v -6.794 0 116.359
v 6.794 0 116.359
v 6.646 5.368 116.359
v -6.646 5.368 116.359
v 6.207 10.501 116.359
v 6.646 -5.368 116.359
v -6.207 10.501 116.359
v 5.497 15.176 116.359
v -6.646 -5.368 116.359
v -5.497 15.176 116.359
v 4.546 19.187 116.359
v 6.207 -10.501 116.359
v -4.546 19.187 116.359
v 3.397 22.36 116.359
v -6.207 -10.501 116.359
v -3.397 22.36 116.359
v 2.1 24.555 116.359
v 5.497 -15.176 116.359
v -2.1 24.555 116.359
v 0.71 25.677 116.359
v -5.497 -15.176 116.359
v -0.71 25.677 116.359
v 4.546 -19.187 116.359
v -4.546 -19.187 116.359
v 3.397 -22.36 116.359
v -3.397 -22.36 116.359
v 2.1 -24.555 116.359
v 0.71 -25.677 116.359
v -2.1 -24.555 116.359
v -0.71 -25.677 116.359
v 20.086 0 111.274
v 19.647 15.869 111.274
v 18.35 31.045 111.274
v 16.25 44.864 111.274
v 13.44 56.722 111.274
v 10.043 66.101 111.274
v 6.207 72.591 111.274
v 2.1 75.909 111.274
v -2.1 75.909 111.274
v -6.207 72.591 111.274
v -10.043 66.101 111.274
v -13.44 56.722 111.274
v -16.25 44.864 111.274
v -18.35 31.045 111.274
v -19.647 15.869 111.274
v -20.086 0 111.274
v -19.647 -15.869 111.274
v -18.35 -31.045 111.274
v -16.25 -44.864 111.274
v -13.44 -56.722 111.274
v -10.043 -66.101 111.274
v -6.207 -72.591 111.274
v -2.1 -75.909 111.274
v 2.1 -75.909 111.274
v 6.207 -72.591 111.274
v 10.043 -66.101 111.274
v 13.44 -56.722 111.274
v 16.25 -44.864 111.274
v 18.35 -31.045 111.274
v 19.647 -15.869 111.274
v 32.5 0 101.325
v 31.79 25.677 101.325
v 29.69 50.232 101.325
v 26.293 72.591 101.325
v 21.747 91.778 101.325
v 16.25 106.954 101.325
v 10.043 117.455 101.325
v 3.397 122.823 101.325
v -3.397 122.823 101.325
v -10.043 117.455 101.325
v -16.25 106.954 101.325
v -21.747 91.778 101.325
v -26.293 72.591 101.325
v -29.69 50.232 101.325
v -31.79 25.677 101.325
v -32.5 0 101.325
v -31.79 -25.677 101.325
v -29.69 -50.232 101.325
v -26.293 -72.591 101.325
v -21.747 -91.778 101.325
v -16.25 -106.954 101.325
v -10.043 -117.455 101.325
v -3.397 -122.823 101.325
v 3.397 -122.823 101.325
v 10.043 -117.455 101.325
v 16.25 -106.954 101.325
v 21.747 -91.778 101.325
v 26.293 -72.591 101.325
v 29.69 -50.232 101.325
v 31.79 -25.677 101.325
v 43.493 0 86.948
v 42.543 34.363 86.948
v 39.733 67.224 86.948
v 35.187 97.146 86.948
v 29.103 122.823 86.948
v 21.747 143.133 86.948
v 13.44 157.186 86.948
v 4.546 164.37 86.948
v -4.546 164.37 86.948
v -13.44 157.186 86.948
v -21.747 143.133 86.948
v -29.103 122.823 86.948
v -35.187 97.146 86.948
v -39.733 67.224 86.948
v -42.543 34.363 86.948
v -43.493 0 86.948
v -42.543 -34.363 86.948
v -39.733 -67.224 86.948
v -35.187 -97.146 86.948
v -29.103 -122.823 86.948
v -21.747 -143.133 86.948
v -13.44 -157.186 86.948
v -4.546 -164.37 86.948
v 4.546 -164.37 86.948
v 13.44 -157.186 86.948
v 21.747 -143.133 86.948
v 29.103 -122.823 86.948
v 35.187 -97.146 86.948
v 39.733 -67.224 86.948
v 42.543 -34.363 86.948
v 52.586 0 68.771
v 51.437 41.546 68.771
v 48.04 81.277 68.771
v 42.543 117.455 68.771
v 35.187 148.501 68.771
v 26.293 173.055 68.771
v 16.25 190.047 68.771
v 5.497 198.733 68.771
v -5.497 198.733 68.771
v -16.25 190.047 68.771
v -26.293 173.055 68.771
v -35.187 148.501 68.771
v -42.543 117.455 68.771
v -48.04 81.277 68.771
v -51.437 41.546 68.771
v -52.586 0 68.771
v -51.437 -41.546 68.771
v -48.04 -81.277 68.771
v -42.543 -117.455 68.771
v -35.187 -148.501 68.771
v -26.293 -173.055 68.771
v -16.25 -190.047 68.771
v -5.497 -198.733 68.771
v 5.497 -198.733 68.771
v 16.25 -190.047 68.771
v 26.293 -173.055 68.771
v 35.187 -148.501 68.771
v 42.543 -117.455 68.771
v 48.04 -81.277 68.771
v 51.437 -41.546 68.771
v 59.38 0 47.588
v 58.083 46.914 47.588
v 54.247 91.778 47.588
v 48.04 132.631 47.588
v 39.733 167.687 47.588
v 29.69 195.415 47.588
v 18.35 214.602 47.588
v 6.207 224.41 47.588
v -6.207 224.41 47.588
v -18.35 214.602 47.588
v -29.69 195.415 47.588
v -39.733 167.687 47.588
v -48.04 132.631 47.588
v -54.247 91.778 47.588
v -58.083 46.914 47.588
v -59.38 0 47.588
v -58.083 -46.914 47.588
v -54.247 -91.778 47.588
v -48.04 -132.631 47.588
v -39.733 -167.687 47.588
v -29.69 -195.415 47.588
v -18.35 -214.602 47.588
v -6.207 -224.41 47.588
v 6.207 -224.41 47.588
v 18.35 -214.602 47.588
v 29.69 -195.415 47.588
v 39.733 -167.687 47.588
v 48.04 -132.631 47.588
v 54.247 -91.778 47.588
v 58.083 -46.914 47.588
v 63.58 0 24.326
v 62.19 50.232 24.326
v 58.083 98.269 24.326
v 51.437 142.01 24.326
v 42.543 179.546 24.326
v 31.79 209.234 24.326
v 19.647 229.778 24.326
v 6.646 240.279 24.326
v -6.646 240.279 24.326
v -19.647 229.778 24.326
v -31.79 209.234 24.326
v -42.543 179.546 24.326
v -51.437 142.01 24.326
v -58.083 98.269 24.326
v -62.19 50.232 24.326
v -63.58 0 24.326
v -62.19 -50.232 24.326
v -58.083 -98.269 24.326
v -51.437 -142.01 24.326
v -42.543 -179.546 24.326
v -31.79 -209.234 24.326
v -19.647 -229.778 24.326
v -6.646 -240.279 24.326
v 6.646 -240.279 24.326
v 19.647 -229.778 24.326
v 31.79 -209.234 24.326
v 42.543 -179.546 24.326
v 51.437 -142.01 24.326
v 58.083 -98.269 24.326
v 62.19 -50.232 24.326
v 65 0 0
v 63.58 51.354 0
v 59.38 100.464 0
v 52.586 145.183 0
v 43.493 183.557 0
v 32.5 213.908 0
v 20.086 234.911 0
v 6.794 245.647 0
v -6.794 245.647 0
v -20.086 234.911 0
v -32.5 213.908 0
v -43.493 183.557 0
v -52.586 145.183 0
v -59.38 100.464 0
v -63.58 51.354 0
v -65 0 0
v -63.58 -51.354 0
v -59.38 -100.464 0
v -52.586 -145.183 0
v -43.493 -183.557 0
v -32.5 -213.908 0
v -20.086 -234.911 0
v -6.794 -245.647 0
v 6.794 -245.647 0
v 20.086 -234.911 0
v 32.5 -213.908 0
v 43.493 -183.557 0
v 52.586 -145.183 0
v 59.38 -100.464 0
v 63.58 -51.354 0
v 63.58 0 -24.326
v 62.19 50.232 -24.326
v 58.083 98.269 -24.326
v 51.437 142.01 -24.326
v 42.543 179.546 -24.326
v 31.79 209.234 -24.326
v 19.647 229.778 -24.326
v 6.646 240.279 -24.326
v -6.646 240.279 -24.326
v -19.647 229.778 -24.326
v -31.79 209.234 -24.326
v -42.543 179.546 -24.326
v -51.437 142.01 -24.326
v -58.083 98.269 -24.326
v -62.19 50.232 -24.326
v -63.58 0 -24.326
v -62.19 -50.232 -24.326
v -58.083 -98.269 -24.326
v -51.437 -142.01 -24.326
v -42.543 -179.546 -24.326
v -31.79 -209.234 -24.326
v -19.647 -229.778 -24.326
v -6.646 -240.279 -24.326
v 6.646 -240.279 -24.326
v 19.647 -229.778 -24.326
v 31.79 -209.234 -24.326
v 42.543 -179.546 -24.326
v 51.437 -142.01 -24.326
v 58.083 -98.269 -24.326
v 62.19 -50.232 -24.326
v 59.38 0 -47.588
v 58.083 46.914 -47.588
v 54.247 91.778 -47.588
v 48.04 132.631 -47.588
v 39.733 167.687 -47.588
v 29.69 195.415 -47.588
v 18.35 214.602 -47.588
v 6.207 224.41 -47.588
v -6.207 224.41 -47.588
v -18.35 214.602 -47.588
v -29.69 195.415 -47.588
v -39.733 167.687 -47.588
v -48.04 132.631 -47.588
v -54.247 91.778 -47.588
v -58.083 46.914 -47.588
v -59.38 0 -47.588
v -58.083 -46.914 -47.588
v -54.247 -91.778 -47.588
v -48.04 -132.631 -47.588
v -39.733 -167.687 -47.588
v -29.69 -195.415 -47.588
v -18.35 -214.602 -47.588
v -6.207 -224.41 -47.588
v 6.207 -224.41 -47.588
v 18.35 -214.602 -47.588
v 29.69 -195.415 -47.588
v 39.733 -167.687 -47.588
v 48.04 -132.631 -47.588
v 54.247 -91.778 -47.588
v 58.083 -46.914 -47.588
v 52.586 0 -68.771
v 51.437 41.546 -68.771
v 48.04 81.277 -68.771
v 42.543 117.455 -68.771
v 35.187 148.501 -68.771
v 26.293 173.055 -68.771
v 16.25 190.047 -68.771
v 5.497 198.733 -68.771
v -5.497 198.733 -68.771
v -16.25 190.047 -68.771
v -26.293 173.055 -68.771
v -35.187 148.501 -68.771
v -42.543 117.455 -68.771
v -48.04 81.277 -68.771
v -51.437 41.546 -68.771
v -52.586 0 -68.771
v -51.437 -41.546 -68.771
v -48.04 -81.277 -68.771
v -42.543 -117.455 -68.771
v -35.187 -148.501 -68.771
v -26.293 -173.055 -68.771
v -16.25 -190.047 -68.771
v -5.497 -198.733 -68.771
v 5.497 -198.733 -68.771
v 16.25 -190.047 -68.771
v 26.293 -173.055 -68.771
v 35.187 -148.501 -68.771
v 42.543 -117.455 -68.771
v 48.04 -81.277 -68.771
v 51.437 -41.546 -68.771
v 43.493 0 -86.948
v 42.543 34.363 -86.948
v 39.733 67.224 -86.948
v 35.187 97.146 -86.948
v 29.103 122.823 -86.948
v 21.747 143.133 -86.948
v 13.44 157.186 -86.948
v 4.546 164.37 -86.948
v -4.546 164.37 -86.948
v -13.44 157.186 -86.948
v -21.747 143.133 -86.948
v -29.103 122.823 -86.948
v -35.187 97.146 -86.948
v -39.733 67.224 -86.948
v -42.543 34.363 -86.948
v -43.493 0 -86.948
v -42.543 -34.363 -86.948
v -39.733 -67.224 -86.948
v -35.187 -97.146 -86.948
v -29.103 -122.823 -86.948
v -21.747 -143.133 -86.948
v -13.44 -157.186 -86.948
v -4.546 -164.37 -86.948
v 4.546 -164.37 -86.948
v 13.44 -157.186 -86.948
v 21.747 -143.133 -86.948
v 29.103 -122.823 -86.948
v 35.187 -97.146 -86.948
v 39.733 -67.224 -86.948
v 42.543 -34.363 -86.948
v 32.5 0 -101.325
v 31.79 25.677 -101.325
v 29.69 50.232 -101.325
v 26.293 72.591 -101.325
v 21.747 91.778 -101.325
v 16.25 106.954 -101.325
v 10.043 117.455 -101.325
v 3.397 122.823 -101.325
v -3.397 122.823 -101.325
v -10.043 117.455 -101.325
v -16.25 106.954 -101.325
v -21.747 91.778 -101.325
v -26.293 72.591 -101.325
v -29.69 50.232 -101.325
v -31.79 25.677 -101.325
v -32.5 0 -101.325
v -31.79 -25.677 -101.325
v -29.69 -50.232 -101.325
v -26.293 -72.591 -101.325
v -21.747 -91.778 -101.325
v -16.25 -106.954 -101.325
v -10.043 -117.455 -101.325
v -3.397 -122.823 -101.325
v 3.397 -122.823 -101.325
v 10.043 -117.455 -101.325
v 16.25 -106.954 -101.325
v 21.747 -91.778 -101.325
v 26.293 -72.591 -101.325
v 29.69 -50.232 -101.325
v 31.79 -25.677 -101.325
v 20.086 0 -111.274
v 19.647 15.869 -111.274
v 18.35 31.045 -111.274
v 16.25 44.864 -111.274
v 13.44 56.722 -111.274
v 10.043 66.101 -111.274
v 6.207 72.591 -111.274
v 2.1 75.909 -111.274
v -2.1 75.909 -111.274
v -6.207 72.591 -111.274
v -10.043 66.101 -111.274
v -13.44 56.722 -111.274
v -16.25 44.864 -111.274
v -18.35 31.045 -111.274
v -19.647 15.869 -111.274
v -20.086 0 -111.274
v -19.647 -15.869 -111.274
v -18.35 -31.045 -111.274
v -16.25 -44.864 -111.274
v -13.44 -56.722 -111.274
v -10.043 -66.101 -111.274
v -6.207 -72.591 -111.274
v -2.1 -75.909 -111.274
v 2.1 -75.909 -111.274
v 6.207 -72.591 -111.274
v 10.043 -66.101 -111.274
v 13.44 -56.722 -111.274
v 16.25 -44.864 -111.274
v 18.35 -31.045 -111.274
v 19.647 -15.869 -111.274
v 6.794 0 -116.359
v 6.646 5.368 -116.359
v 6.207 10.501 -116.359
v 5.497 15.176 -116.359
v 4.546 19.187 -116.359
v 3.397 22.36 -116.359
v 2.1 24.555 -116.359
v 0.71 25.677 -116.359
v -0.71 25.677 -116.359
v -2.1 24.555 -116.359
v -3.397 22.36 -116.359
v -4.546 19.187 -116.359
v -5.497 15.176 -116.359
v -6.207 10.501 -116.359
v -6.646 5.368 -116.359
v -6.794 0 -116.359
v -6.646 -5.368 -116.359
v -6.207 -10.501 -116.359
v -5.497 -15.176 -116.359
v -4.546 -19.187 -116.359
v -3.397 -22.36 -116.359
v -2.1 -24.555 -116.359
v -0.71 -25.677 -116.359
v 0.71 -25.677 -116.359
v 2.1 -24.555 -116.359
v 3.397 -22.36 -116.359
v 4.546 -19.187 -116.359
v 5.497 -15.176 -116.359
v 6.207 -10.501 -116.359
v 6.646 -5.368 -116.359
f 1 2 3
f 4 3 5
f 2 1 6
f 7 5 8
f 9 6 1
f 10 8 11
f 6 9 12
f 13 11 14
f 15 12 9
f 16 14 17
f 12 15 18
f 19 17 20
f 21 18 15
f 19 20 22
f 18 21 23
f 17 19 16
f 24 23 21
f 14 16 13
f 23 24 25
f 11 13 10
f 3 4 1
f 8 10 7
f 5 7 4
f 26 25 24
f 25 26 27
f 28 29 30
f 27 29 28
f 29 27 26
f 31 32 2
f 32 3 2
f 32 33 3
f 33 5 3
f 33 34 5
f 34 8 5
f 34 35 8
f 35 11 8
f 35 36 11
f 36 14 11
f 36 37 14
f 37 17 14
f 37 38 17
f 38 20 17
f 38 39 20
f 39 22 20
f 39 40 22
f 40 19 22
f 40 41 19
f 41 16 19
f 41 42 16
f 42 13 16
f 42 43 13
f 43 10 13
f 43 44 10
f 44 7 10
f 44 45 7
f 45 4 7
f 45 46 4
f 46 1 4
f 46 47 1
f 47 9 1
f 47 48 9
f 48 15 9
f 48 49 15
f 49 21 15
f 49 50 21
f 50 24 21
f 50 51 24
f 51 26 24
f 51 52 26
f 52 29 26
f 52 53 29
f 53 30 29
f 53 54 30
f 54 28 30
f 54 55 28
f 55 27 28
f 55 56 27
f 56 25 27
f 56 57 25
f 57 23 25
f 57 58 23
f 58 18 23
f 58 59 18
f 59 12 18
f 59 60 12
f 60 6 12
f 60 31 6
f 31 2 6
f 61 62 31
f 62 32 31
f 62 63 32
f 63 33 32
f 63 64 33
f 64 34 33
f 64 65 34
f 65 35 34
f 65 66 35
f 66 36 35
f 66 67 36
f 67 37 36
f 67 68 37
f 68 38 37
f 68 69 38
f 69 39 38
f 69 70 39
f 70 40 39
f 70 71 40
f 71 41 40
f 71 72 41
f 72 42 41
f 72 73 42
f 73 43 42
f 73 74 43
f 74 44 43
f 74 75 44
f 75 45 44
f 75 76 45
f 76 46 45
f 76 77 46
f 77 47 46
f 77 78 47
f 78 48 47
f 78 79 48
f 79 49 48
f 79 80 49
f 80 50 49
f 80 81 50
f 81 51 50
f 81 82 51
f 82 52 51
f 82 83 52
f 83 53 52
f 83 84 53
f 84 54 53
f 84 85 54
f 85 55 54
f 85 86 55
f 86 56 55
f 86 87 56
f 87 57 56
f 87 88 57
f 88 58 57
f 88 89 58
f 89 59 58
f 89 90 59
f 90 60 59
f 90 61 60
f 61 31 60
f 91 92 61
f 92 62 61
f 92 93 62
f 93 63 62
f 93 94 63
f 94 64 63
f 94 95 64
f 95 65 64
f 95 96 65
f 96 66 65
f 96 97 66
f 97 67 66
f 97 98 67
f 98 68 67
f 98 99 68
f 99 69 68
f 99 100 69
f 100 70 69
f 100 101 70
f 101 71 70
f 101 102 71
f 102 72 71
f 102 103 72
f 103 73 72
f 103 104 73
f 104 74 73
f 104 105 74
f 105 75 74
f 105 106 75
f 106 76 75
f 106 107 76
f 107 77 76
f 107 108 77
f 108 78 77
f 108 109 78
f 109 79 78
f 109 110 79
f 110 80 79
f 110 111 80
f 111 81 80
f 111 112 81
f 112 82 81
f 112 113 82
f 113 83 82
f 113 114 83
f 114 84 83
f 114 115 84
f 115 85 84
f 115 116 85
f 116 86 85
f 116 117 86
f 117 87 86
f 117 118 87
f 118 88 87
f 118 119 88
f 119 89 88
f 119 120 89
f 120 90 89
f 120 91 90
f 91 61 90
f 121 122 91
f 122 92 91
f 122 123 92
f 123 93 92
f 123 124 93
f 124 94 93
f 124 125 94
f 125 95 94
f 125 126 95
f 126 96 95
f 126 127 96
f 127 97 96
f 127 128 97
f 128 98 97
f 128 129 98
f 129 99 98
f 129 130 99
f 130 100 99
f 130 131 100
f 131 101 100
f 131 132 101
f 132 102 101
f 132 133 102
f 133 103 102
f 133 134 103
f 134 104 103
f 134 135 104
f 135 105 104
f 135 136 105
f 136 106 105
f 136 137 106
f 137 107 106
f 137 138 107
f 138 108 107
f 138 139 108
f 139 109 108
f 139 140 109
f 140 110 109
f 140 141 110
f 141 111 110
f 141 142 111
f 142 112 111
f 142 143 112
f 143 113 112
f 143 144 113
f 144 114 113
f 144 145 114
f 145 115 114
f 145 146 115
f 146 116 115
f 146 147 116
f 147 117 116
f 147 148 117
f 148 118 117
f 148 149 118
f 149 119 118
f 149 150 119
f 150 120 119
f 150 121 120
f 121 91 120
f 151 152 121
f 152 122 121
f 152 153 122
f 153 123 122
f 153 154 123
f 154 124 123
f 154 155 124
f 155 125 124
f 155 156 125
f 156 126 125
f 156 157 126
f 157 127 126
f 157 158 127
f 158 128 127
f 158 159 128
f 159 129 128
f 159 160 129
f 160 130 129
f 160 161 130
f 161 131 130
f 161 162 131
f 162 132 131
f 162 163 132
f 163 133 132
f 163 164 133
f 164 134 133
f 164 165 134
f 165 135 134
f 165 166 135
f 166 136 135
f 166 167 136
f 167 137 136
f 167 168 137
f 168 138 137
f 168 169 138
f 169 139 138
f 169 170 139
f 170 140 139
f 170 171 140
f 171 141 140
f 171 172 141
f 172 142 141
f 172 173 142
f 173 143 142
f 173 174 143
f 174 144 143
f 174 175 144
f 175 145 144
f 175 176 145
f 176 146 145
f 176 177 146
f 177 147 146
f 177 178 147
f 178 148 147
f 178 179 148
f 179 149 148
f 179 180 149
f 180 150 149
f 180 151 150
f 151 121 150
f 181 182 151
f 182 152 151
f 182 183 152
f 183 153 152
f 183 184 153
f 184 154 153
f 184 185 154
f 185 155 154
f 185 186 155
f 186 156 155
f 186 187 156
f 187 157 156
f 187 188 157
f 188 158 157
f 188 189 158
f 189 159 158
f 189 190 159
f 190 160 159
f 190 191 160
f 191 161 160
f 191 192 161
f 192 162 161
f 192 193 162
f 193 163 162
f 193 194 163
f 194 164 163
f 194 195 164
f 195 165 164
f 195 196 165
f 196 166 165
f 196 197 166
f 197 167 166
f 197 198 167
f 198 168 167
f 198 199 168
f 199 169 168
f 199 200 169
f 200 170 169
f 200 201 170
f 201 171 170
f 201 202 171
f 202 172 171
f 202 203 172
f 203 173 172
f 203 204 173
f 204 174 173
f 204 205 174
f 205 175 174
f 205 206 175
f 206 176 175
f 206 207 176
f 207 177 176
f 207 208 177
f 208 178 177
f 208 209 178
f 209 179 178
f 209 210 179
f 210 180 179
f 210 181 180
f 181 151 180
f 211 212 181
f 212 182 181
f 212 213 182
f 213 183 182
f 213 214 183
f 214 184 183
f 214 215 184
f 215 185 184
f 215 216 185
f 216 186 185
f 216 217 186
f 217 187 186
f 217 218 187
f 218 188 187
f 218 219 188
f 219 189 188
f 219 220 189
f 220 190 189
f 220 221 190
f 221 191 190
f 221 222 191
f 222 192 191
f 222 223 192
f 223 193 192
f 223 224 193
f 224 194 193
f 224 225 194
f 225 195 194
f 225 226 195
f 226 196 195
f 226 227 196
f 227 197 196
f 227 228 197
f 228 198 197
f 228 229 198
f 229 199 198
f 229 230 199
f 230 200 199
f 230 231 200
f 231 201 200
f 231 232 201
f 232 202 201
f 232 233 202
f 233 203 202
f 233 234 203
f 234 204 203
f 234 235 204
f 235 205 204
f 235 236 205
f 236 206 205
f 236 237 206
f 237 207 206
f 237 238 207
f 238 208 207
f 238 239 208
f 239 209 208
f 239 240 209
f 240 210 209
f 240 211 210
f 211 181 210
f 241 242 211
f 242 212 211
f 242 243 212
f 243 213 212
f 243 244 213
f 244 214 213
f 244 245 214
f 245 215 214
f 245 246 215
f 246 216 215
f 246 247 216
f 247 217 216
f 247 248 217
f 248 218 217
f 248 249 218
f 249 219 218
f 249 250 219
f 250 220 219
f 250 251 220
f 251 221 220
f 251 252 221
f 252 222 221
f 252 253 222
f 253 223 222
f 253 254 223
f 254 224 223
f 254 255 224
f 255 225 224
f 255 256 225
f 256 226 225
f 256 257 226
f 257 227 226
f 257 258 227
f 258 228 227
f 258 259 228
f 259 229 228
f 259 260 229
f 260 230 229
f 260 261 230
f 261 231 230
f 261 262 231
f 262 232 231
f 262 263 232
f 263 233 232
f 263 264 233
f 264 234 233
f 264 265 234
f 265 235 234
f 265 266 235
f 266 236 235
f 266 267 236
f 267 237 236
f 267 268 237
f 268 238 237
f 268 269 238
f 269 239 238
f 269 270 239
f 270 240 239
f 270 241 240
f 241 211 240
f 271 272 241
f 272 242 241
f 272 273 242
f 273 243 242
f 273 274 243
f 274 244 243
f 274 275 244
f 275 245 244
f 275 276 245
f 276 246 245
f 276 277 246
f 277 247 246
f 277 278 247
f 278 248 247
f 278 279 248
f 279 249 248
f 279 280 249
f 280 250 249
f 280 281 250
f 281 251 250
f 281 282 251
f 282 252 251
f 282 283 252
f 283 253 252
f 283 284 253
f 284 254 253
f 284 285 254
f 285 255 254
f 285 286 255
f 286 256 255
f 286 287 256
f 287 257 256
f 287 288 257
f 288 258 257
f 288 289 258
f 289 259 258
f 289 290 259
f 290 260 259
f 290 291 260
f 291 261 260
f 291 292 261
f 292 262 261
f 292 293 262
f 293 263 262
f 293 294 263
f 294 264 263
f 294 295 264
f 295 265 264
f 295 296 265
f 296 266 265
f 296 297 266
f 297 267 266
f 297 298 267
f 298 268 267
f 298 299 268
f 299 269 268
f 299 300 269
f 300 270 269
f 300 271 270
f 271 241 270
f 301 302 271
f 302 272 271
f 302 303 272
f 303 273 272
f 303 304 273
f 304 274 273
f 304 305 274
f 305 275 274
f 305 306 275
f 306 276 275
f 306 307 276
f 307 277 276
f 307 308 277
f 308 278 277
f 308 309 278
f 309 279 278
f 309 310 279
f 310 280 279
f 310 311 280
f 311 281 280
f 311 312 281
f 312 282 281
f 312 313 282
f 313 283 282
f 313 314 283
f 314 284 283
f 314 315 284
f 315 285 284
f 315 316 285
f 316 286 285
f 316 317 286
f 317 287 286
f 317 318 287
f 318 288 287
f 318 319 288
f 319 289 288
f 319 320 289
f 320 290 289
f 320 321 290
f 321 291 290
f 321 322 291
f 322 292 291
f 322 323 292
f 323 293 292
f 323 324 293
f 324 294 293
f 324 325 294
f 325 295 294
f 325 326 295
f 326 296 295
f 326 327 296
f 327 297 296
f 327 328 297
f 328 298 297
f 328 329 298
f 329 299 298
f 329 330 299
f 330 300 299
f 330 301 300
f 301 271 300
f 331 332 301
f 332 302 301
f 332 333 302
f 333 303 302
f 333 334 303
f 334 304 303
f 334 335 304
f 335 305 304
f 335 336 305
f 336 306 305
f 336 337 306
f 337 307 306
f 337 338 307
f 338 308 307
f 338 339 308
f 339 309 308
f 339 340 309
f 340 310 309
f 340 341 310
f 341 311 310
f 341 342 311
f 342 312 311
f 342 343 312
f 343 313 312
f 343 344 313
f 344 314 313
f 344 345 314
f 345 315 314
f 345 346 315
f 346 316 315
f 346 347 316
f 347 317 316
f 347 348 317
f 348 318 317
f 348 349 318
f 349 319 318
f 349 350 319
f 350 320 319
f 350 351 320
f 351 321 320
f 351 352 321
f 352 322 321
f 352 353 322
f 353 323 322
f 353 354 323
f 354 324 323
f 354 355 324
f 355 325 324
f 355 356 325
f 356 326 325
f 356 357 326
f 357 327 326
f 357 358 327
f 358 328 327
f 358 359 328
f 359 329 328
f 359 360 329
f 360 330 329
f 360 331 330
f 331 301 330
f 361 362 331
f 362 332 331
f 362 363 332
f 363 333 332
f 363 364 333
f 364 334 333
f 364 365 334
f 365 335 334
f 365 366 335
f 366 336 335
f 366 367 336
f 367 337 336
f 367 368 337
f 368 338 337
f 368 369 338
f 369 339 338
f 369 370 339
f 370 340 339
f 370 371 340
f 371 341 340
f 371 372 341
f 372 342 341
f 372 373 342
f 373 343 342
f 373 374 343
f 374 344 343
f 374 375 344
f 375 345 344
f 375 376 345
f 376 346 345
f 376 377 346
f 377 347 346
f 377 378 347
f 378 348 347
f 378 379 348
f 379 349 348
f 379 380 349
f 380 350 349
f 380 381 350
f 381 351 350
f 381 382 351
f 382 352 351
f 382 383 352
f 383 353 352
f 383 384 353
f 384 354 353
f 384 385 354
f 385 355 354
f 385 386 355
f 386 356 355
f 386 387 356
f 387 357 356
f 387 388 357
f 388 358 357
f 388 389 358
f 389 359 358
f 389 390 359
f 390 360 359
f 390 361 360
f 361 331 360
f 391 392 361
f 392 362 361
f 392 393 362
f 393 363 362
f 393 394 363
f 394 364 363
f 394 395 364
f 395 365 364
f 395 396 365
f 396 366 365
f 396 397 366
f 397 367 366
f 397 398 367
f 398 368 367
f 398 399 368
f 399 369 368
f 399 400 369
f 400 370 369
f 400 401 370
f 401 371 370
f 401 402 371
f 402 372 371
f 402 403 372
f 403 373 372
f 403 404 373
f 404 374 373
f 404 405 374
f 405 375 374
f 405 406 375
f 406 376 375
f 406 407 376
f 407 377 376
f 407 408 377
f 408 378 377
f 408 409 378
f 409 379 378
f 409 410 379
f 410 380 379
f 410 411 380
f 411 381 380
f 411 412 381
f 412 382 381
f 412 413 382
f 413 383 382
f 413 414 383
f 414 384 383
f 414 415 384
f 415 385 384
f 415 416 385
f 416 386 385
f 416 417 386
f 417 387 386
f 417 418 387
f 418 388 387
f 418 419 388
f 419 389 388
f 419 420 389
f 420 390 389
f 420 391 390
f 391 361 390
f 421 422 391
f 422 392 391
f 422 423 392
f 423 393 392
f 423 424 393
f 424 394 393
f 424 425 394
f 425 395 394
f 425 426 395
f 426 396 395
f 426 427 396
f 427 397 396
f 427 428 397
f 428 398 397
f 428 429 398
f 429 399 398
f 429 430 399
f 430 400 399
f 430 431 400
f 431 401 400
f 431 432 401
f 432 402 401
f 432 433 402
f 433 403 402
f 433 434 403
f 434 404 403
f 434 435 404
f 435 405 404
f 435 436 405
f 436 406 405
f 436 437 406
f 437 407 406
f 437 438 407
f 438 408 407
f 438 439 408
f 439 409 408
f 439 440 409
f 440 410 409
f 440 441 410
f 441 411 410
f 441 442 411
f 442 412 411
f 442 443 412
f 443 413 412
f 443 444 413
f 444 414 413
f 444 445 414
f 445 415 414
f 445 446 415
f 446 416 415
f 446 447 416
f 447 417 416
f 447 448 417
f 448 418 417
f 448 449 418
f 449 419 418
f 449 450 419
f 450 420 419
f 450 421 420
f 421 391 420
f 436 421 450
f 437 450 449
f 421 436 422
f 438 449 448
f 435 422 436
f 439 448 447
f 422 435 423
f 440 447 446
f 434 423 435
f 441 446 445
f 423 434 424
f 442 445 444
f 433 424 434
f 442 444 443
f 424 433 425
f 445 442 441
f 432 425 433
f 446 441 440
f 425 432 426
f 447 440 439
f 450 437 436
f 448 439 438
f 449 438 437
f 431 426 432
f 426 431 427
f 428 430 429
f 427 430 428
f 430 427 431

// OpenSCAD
// Generated by SolidPython 1.0.1 on 2020-07-29 00:46:47


scale(v = [5, 19, 9]) {
	sphere(r = 13);
}
/***********************************************
*********      SolidPython code:      **********
************************************************
 
# import packages: SolidPython
from solid import *
from solid.utils import *
from itertools import chain, combinations, permutations


class Resize:

    def __init__(self, scad_file):
        self.scad_file = scad_file
        #self.scad_file = import_scad(scad_file)
        # cone/cylinder param:
        self.r1 = 0
        self.r2 = 0
        self.h = 0
        # rectangular prism param:
        self.w = 0
        self.l = 0
        # ellipse param:
        self.r = 0

    # import OpenScad code (file name corresponds to shape)


    # classify shape + parameters
    def assign(self, param1, param2, param3):
        if self.scad_file == 'cone.scad':
            self.r1 = param1
            self.r2 = param2
            self.h = param3
        elif self.scad_file == 'cylinder.scad':
            self.r1 = param1
            self.r2 = param2
            self.h = param3
        elif self.scad_file == 'rectangularPrism.scad':
            self.h = param1
            self.l = param2
            self.w = param3
        else:
            self.r = param1
            self.h = param2

    # resize parameters
    def iterate(self):
        x = range(3, 20, 2)
        i = 1
        if self.scad_file == 'cone.scad':
            tempList = list(permutations(x, 2))
            for temp in tempList:
                param1 = temp[0]
                param2 = temp[1]
                filepath = 'produced_scad_files/' + 'cone' + str(param1) + '_' + str(param2) + '_' + '.scad'
                scad_render_to_file(cylinder(h=param1, r1=param2, r2=0), filepath)

        elif self.scad_file == 'cylinder.scad':
            tempList = list(permutations(x, 3))
            for temp in tempList:
                param1 = temp[0]
                param2 = temp[1]
                filepath = 'produced_scad_files/' + 'cylinder' + str(param1) + '_' + str(param2) + '_' + '.scad'
                scad_render_to_file(cylinder(h=param1, r1=param2, r2=param2), filepath)

        elif self.scad_file == 'rectangularPrism.scad':
            tempList = list(permutations(x, 3))
            for temp in tempList:
                param1 = temp[0]
                param2 = temp[1]
                param3 = temp[2]
                filepath = 'produced_scad_files/' + 'rectangularPrism' + str(param1) + '_' + str(param2) + '_' + str(
                    param3) + '.scad'
                scad_render_to_file(cube(size=(param1, param2, param3)), filepath)

        elif self.scad_file == 'ellipse.scad':
            tempList = list(permutations(x, 4))
            for temp in tempList:
                param1 = temp[0]
                param2 = temp[1]
                param3 = temp[2]
                param4 = temp[3]
                filepath = 'produced_scad_files/' + 'ellipse' + str(param1) + '_' + str(param2) + '_' + str(param3) + '_' + str(param4) + '.scad'
                scad_render_to_file(scale([param1, param2, param3])(sphere(r=param4)), filepath)

    def render_to_scadfile(self):
        scad_render_to_file(scad, 'example.scad') 
 
************************************************/
